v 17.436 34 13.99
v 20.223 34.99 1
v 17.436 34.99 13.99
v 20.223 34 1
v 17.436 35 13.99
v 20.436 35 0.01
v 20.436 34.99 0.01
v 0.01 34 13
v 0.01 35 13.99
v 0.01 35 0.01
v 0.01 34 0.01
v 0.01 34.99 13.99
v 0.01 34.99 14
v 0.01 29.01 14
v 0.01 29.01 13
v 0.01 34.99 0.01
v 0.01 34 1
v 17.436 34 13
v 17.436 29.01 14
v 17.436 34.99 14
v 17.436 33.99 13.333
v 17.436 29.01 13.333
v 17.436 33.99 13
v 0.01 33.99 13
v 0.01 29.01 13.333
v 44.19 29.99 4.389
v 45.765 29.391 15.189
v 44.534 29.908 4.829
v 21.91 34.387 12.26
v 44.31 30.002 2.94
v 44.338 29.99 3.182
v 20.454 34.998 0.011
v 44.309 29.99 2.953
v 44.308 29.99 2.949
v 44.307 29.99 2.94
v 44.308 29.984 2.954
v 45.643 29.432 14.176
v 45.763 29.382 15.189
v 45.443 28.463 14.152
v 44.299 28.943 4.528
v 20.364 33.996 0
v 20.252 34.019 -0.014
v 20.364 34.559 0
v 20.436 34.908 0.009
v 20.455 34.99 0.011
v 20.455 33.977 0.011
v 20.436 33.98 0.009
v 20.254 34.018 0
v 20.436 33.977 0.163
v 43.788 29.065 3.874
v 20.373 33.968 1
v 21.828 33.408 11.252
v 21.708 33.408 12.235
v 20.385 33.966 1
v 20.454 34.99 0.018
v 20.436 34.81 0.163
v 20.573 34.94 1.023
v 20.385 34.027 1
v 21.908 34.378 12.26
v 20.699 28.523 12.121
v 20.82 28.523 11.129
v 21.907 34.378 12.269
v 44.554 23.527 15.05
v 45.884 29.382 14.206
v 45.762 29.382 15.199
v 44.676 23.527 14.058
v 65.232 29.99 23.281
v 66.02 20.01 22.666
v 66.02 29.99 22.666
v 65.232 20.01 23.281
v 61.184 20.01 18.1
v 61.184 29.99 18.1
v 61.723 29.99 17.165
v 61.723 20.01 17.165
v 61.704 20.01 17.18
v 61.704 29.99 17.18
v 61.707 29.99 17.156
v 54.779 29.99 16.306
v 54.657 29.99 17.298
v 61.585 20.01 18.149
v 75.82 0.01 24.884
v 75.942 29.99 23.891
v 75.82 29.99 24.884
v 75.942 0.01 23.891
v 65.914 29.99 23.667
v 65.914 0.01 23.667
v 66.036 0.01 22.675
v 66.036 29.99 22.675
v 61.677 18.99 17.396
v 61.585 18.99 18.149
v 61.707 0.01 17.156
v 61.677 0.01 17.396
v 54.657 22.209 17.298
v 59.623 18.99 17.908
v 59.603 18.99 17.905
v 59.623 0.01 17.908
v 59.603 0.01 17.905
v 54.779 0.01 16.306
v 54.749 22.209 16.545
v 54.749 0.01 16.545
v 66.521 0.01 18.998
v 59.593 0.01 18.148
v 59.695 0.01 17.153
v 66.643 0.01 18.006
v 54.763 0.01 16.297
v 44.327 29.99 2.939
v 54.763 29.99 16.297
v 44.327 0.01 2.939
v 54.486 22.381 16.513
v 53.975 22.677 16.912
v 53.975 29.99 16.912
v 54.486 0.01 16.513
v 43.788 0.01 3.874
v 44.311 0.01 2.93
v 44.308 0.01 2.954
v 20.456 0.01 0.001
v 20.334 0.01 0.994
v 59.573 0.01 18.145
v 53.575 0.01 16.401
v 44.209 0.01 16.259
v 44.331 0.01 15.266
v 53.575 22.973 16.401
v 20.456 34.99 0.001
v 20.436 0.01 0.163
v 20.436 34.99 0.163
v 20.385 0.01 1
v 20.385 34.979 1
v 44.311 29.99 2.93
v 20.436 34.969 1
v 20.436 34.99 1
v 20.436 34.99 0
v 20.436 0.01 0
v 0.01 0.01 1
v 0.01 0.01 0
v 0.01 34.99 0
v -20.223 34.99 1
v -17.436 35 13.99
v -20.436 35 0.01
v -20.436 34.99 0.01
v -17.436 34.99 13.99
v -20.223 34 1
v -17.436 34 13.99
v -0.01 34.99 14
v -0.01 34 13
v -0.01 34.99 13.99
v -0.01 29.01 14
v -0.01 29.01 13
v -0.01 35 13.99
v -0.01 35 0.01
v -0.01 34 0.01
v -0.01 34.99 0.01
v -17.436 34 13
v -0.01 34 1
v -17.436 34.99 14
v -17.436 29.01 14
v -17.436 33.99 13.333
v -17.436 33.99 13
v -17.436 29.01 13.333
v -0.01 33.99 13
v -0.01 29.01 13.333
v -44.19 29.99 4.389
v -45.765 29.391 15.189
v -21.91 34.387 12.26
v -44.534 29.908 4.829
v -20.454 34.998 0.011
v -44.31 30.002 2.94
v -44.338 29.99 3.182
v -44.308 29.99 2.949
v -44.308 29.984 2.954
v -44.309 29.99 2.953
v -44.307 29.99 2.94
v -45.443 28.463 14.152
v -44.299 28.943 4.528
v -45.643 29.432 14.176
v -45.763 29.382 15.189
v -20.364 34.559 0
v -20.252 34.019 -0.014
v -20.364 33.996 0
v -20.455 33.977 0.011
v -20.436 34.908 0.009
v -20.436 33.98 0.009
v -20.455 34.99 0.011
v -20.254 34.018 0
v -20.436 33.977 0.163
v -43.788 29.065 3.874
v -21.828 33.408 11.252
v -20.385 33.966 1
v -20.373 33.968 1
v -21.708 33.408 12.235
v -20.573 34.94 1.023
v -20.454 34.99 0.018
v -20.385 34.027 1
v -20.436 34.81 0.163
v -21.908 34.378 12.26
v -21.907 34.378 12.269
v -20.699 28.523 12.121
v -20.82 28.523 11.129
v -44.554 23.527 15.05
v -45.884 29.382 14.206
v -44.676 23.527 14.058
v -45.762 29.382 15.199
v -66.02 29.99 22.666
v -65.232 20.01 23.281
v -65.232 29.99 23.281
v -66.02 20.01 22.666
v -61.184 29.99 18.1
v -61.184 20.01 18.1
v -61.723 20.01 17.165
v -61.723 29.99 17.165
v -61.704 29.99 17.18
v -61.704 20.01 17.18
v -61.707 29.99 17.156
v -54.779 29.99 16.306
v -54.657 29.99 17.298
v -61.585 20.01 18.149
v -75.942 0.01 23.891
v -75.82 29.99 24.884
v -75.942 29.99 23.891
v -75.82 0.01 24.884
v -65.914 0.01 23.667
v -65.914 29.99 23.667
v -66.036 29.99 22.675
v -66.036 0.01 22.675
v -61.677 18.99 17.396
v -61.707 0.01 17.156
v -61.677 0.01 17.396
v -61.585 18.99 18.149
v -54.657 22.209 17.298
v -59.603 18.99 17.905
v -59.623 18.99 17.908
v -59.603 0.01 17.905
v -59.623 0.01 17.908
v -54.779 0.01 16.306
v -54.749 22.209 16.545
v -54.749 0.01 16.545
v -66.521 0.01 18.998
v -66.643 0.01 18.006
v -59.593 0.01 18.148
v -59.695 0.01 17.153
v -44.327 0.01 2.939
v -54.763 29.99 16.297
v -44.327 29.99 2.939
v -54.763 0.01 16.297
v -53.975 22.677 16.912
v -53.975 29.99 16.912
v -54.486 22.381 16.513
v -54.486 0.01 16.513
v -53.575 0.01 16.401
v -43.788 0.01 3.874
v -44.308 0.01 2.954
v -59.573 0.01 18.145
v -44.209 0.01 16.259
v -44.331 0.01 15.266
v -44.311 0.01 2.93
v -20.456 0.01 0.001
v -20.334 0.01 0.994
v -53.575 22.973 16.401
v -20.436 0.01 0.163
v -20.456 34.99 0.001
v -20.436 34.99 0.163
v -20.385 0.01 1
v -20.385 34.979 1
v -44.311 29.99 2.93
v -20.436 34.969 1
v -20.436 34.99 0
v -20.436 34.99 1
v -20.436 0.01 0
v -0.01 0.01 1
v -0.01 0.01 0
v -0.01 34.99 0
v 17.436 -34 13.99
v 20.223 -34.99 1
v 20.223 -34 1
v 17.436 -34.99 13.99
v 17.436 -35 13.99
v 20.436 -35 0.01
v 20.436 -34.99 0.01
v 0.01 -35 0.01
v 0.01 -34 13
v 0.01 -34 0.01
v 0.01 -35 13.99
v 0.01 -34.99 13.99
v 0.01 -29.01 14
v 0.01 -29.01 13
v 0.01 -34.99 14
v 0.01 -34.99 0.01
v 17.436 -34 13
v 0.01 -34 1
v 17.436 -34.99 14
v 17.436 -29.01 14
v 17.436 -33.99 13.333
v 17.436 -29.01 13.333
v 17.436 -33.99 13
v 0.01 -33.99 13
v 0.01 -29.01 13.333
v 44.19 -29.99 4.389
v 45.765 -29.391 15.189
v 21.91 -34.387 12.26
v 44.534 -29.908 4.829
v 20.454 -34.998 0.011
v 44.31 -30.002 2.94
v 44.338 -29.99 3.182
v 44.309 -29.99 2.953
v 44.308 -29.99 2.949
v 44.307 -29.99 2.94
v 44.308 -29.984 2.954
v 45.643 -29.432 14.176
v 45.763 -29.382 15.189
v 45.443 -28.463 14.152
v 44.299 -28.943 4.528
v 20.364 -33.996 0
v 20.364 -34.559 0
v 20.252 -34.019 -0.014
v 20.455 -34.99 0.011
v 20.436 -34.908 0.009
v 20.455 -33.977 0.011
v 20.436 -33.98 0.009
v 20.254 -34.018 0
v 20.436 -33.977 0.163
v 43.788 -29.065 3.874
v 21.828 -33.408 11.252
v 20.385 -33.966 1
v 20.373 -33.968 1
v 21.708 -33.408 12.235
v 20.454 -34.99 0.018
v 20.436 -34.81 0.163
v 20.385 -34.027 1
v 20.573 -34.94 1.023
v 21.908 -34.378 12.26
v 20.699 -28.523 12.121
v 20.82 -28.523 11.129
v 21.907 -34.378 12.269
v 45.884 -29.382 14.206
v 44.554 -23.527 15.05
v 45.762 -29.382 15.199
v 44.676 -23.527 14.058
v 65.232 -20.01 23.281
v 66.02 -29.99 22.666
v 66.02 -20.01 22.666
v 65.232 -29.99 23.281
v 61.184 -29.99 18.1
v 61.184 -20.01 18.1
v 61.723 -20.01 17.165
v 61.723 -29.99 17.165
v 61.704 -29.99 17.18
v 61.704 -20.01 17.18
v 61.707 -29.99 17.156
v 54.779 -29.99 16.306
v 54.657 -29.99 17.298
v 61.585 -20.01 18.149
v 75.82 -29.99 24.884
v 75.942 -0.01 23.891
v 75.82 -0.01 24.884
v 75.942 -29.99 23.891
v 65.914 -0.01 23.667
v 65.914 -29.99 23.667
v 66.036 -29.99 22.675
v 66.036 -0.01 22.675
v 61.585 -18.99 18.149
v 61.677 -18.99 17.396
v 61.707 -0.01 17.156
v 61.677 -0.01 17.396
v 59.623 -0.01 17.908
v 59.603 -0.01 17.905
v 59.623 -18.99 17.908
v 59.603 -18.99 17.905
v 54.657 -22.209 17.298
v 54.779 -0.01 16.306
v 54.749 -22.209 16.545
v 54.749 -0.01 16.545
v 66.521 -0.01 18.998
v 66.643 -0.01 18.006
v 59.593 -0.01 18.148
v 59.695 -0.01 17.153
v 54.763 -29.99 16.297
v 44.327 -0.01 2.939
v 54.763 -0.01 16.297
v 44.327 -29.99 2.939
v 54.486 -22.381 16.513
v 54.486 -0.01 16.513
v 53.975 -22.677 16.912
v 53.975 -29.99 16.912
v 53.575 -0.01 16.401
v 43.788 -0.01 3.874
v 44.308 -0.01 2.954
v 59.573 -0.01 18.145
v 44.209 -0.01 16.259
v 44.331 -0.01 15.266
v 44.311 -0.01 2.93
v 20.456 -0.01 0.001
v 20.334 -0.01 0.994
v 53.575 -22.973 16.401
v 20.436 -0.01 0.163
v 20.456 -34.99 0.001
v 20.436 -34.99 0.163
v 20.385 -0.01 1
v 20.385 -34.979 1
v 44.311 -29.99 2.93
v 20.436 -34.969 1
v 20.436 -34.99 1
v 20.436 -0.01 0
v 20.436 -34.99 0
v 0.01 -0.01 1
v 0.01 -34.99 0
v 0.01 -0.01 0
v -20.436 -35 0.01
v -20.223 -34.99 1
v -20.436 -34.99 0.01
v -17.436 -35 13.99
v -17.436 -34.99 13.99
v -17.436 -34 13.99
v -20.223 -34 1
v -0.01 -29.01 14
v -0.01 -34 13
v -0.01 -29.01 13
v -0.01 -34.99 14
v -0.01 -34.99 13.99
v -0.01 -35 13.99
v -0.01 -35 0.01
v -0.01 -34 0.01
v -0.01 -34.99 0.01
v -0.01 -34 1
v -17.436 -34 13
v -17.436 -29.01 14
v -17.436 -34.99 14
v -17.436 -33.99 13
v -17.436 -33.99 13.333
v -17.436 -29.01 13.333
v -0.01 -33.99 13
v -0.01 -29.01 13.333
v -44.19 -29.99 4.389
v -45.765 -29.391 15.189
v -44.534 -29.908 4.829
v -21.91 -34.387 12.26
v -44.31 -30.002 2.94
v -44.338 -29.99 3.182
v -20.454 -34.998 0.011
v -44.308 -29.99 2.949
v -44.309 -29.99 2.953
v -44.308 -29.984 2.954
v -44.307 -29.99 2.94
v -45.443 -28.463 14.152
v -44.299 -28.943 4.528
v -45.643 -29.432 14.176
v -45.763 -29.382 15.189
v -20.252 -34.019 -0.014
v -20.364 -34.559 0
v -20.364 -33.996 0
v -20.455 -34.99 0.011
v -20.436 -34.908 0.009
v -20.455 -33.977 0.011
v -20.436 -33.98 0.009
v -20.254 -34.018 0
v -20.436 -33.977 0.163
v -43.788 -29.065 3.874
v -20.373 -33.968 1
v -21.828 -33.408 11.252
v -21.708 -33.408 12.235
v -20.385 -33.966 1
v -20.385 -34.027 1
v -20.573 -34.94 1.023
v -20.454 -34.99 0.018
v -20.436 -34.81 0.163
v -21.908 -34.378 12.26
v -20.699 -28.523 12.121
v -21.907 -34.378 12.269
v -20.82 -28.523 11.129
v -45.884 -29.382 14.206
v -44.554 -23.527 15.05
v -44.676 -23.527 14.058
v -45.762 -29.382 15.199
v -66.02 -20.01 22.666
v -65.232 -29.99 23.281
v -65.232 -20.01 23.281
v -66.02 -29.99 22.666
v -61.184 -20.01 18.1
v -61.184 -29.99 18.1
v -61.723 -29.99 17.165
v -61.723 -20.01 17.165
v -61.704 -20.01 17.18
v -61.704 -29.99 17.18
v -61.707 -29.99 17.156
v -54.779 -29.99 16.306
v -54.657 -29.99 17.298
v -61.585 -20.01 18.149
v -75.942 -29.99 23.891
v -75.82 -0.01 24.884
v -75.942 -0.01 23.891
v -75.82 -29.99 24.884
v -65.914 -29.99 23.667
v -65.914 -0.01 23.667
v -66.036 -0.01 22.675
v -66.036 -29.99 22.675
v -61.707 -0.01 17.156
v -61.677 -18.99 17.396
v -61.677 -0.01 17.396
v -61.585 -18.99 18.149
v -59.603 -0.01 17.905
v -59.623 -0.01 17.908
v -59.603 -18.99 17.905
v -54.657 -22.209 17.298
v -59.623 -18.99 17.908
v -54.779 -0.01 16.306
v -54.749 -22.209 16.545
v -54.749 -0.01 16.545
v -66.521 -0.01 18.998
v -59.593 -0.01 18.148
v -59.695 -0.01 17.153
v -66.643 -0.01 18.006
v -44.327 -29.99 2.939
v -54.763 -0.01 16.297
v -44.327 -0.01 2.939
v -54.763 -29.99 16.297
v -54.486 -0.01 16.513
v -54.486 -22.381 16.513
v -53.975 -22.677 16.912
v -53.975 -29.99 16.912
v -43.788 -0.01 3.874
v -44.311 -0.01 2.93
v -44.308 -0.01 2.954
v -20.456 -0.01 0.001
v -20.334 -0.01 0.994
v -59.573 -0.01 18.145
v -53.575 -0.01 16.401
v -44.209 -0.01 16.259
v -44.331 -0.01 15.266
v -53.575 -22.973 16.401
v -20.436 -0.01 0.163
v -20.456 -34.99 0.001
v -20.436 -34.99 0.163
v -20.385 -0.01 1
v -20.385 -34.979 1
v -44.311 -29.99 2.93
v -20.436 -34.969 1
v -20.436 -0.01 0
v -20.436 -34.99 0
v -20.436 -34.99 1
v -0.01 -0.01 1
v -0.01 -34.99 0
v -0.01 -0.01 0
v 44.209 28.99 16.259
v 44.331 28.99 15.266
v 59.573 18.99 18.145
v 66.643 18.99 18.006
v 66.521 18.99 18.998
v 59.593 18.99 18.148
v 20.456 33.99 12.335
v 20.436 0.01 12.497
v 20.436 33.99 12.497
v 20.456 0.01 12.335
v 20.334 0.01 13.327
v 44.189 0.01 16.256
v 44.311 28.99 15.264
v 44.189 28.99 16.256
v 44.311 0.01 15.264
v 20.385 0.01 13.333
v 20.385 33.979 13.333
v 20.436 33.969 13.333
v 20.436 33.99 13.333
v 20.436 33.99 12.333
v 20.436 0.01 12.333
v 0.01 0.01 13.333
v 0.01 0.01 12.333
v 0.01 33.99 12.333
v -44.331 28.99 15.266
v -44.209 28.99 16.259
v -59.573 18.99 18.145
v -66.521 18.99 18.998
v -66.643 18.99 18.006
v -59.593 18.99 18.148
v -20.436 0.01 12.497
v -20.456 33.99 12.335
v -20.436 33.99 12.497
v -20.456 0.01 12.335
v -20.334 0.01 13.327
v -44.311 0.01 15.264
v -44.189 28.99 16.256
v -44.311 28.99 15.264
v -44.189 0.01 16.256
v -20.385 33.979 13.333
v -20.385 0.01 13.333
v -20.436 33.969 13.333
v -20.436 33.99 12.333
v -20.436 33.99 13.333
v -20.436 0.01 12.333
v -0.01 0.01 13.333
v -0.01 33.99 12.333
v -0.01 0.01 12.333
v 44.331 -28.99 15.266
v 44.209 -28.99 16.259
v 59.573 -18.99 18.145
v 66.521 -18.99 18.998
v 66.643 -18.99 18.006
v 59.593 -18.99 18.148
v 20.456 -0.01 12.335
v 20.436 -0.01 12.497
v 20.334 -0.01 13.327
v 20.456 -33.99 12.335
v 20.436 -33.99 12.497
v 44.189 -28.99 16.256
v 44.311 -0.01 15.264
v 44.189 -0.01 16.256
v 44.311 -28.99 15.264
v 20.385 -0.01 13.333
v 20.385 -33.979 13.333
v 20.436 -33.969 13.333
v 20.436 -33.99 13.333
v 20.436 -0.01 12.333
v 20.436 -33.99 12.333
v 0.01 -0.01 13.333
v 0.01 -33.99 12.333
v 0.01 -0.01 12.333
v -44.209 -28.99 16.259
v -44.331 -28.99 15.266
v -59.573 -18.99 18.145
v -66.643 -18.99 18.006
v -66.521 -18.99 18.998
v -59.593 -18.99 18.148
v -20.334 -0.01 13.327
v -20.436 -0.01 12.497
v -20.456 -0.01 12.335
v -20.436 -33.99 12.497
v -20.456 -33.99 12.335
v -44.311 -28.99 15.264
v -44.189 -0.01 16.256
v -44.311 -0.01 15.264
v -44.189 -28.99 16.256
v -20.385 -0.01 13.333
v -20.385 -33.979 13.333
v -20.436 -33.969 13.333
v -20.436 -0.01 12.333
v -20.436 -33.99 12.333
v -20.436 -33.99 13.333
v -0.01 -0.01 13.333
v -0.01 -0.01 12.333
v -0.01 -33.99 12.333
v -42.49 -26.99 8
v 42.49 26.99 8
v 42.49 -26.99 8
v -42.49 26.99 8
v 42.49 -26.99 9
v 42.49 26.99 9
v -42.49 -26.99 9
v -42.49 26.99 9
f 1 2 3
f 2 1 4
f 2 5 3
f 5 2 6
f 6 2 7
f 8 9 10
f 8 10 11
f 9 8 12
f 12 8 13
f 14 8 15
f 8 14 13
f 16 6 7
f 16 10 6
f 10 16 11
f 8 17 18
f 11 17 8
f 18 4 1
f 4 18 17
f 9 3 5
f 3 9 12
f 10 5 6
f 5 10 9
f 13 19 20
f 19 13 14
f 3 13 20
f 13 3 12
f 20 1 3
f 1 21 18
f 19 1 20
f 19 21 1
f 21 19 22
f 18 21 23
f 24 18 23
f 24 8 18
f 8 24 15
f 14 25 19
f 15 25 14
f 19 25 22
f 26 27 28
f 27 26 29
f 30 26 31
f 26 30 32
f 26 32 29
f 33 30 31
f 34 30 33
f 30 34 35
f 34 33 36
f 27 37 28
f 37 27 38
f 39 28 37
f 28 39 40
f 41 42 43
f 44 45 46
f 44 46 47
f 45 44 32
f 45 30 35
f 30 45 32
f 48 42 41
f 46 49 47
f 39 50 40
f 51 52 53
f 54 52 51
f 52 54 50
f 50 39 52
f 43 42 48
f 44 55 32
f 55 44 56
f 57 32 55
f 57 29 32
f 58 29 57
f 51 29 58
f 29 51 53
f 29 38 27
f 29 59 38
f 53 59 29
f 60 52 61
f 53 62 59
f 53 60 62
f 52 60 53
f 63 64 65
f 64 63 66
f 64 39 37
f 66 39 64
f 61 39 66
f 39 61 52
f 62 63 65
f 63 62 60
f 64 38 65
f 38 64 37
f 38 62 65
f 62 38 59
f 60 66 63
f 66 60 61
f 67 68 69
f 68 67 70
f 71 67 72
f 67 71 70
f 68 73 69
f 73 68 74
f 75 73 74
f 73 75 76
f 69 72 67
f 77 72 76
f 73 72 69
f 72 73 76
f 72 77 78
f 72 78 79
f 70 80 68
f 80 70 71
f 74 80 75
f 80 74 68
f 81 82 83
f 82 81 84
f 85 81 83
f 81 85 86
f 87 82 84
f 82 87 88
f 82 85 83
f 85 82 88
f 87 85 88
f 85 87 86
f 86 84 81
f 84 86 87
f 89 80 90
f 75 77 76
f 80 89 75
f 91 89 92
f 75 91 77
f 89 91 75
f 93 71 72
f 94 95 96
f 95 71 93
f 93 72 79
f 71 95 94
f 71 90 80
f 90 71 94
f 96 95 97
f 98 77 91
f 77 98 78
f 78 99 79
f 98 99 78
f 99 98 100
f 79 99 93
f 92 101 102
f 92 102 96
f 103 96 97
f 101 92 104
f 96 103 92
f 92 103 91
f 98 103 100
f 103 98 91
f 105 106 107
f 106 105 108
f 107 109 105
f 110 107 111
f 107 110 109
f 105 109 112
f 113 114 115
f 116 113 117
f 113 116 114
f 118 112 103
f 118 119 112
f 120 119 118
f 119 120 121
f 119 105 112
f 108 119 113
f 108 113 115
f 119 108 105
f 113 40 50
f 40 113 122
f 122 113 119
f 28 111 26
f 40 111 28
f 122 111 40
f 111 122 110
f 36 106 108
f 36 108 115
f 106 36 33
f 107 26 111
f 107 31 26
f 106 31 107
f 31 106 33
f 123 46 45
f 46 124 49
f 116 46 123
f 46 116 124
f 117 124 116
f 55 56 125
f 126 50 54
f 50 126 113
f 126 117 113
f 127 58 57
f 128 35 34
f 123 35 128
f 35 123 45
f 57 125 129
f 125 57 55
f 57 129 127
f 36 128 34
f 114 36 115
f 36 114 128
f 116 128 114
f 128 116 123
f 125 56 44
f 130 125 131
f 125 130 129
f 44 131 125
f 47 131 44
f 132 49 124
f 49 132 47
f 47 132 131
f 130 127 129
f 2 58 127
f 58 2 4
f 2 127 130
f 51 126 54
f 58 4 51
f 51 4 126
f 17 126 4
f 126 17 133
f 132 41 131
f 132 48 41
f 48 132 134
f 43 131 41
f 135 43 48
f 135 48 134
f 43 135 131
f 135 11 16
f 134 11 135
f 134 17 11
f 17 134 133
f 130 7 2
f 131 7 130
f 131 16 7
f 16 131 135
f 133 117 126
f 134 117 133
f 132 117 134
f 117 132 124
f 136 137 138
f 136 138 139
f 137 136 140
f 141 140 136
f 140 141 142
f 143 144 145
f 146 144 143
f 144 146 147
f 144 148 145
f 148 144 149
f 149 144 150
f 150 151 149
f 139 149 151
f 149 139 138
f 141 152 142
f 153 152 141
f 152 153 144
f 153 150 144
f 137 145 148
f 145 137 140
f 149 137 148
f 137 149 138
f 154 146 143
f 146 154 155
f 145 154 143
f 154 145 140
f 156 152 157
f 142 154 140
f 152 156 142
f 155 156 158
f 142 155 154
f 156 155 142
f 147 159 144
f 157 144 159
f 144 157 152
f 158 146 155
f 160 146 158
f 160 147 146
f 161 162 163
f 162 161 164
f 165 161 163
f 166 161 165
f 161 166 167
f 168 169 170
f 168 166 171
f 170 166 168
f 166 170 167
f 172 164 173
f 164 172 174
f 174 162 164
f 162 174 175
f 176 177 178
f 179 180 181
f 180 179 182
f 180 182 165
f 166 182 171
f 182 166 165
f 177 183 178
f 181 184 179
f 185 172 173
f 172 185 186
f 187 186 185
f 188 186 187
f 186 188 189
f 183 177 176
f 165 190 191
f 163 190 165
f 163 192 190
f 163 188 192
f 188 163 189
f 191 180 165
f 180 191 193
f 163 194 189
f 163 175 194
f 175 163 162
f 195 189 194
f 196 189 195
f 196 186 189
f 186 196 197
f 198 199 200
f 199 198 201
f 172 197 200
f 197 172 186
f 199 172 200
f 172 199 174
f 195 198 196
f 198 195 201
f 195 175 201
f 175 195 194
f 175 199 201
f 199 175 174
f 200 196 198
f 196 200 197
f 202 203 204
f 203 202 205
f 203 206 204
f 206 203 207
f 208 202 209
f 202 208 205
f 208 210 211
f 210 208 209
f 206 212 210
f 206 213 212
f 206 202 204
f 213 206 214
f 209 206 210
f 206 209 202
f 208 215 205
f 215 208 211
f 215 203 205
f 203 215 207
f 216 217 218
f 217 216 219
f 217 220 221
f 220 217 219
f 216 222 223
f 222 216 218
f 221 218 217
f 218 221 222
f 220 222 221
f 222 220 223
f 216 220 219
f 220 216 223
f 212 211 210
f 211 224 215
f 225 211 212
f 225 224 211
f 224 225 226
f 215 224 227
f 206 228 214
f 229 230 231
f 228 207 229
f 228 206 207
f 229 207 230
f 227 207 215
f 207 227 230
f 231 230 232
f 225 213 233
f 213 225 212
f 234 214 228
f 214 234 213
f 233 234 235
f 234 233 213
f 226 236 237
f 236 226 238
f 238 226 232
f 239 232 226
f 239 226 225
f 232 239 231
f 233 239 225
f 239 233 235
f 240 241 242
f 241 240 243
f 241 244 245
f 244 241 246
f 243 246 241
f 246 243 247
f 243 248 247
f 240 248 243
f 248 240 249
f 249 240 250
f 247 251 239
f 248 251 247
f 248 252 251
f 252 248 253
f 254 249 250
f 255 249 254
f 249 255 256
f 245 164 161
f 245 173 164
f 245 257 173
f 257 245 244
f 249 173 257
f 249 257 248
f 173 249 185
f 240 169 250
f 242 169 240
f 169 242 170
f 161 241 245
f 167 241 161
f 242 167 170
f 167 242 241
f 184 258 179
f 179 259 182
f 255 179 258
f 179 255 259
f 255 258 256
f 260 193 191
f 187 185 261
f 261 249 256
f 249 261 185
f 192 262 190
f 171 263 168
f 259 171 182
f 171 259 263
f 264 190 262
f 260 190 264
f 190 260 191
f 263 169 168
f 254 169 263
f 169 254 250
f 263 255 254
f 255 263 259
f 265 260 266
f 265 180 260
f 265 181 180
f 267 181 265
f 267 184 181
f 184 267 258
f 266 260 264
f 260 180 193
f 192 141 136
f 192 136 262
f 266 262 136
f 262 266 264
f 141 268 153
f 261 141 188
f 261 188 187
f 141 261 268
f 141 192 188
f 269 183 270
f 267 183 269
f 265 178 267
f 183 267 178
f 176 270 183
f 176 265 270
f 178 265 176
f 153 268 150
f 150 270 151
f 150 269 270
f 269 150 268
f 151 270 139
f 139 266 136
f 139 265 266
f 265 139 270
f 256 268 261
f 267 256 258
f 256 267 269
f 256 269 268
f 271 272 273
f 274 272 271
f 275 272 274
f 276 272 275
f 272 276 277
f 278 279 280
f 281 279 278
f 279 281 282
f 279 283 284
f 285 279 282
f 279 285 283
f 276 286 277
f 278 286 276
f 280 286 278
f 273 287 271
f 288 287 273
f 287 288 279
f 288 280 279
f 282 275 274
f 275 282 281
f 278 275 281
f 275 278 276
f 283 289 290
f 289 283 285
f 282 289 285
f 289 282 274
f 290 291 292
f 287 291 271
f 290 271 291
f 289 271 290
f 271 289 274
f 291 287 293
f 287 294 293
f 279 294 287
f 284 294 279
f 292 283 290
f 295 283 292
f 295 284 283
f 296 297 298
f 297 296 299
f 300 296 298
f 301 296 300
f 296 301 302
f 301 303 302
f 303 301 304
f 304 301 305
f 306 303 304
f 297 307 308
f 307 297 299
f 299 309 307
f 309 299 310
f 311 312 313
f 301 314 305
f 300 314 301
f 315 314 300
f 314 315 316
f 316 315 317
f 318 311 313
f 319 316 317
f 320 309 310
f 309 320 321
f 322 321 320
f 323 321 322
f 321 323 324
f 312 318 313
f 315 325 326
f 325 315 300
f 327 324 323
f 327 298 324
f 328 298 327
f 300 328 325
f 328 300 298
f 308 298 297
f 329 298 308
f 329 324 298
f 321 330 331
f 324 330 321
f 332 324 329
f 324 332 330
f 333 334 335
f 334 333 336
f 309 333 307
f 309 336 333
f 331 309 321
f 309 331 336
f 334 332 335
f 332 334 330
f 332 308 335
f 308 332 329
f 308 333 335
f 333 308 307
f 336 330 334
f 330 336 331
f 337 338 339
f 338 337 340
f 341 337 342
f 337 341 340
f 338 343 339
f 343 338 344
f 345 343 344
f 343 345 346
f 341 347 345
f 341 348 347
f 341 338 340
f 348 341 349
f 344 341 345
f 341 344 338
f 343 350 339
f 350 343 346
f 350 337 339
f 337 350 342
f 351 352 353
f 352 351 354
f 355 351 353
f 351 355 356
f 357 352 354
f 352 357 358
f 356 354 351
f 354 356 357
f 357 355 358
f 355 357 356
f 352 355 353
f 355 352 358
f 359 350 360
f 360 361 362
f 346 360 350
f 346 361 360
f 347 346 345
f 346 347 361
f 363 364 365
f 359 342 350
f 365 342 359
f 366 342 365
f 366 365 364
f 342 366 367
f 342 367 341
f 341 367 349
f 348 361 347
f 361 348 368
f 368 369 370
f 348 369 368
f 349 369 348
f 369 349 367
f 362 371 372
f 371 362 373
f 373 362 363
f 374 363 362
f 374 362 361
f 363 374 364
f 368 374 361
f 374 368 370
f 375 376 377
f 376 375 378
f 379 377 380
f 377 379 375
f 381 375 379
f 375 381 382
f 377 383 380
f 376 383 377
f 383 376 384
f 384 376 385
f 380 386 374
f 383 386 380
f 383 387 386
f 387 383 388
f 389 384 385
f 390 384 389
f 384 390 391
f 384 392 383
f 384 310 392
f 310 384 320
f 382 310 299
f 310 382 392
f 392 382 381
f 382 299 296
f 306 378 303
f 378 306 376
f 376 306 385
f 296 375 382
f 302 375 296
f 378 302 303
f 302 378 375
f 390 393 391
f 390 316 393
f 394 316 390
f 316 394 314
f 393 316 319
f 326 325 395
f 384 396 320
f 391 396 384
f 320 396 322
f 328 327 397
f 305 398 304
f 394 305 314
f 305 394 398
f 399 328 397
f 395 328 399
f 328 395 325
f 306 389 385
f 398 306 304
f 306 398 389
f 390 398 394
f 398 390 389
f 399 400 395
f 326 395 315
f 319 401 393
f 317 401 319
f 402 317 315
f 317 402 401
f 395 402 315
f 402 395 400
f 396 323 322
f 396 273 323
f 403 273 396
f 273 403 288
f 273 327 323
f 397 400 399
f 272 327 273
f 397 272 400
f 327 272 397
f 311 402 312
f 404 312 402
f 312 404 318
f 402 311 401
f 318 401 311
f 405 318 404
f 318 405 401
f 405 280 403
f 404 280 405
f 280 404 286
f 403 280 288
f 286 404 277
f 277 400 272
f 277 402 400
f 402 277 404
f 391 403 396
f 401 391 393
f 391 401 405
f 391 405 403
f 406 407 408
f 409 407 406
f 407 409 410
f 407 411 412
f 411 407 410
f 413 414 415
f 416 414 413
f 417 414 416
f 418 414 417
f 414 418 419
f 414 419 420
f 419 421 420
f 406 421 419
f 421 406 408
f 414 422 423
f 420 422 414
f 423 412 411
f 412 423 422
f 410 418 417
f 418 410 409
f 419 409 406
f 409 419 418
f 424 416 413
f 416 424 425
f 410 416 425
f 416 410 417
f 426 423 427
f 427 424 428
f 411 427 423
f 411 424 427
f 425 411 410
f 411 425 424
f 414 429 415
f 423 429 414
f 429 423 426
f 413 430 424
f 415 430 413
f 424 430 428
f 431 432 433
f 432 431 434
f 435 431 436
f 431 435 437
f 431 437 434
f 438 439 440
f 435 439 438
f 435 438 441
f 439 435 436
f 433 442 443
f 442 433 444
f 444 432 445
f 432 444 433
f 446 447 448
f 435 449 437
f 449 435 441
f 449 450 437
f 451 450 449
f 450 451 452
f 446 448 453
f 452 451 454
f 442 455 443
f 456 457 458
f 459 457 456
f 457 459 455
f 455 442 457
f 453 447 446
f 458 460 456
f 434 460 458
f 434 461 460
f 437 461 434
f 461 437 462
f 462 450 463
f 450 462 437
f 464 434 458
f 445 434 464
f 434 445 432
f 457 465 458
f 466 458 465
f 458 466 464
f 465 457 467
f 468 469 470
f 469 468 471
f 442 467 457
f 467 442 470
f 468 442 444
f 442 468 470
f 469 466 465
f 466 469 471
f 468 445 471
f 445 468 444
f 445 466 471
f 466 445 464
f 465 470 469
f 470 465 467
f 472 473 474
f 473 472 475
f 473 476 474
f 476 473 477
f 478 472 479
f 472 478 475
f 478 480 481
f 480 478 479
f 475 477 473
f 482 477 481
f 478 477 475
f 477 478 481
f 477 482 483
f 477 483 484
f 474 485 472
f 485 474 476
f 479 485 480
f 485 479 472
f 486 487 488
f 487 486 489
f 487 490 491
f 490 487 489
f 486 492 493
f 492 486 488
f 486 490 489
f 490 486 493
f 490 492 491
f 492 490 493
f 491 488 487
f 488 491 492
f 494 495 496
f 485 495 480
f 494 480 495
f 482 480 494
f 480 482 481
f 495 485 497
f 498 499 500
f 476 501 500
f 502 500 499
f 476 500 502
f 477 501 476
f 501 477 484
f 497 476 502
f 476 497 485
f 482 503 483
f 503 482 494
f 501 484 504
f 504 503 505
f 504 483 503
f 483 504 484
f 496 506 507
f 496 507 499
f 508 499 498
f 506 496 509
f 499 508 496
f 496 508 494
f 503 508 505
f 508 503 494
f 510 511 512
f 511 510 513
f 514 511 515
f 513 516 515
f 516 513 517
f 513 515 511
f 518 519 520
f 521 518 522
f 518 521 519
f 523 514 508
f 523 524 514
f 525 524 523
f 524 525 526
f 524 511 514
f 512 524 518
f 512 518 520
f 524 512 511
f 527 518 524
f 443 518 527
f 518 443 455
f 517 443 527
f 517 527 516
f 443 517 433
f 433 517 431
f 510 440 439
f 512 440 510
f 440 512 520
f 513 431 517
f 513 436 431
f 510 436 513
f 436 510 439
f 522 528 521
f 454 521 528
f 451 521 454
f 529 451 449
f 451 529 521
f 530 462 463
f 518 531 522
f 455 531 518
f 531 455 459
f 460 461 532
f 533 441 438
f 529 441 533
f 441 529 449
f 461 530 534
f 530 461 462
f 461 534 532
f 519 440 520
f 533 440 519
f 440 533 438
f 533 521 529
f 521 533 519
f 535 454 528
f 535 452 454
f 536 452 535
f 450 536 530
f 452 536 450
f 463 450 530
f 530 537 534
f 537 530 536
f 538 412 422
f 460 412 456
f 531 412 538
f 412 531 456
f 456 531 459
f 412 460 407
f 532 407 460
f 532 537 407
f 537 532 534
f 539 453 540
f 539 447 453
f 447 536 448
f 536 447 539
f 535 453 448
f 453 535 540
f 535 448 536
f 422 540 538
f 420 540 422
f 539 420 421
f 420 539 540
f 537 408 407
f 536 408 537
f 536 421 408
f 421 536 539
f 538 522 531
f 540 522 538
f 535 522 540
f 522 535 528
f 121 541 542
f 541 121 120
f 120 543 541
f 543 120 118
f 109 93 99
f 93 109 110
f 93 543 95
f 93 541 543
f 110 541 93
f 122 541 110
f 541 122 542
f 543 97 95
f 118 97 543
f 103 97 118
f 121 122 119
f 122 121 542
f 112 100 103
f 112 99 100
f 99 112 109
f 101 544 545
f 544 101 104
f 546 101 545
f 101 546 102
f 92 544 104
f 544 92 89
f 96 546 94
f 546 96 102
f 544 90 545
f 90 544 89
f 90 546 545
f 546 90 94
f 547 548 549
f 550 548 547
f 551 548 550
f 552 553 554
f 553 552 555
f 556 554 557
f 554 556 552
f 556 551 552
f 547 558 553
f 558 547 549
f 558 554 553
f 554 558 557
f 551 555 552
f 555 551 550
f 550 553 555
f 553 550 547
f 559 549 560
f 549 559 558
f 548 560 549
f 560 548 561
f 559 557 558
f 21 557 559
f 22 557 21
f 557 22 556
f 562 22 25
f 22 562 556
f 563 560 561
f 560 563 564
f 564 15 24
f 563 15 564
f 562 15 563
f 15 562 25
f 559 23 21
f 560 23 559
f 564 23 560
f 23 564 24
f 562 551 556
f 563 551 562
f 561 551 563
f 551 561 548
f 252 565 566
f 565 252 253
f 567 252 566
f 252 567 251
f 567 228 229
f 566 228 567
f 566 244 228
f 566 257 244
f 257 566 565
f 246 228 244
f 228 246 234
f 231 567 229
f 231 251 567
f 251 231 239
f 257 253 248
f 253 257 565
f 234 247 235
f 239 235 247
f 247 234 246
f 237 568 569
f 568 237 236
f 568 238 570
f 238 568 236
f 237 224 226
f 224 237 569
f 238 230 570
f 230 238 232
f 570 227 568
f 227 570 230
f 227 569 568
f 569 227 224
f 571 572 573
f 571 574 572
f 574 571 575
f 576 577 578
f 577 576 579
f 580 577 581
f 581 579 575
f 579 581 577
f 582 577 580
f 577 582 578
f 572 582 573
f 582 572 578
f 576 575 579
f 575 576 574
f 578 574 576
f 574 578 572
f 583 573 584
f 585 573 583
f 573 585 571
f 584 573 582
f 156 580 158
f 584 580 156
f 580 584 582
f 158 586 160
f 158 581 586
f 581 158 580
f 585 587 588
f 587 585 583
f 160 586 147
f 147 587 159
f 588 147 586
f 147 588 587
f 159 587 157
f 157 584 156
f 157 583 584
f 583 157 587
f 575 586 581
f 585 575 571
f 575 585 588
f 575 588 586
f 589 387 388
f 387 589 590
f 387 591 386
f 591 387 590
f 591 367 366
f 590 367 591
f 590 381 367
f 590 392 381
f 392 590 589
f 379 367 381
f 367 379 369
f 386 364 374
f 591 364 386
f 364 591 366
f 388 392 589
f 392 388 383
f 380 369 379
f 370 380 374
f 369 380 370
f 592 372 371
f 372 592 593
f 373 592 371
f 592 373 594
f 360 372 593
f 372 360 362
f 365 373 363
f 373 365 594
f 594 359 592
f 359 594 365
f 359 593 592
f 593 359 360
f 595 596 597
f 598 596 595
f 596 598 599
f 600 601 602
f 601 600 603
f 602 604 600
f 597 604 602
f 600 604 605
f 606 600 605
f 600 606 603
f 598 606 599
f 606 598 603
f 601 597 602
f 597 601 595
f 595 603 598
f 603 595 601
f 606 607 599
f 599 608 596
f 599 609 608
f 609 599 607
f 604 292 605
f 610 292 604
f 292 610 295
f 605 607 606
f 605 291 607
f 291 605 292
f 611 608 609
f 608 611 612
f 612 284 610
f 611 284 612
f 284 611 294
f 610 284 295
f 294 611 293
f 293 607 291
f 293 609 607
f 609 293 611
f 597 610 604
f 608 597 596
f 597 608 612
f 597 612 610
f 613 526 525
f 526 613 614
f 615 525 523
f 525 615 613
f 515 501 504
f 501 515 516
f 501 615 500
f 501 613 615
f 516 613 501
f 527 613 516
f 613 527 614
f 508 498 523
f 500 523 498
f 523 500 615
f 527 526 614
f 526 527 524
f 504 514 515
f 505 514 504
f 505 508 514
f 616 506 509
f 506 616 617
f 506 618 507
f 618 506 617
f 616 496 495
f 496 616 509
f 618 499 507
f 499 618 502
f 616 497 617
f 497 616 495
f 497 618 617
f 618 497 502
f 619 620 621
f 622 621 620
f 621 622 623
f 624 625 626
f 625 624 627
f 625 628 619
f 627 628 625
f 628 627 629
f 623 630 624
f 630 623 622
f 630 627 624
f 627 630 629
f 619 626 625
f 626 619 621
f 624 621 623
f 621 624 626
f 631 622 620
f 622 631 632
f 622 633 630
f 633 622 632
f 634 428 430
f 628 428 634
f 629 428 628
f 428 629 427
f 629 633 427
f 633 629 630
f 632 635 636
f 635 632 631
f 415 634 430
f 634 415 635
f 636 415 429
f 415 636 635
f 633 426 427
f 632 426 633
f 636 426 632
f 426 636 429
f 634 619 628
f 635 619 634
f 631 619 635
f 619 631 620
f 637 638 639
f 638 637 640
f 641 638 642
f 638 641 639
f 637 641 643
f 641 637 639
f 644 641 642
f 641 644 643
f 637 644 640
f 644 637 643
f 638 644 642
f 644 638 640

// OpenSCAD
// mode settings

mode = 0; // [0:Flexed, 1:Half flexed, 2:Plane, 3:Animation, 4:Base proj, 5:Cap proj]


anim = ($t<0.5) ? $t*2:(1-$t)*2;
alphaModes = [1,0.5,0,anim,0,0];
alpha = alphaModes[mode];

isBaseProj = mode==4;
isCapProj = mode==5;
isProj = isBaseProj || isCapProj; 

// visible settings 

isBase = true;
isCap = true;
isCred = true; 

xCred=85; 
yCred=54; 
xCredPad=2; 
yCredPad=3;

wMet = 1;
angleSide = 7;

hFlexSide = 12;
hFlexCenter = 14;
coneFlex = 3;
hLimb = 6;

xBase = (xCred+xCredPad*2);

coneSide=5;
xSide = xBase/3.7;
ySideHalf = yCred/2+yCredPad;

xCenterHalf = xBase/2-xSide;
yCenterHalf = yCred/2+yCredPad+coneSide;

xStartHole = 7;          
xBodyHole = 7;
xEndHole = 10;          
yHole = 40;          

module stop_wizard() {}

eps=0.01; // for flex painting

xDown=gipo(hFlexSide, hFlexSide); // 45 deg
dHole = ySideHalf-yHole/2;          
wFlexSide=gipo(coneSide, xSide);

function gipo(x,y) = sqrt(x*x+y*y);  

module trapV(x,y,dx1,dx2) {
    linear_extrude(1) {
    polygon( [
         [0+eps,0+eps],
         [0+eps+dx1,y-eps],
         [x-dx2-eps,y-eps],
         [x-eps,0+eps]]
        );   
    } 
}

module trapG(x,y,dy1,dy2) {
    linear_extrude(1) {
    polygon( [
         [0+eps,0+eps],
         [0+eps,y-eps],
         [x-eps,y-dy1-eps],
         [x-eps,0+dy2+eps]
        ]);   
    } 
}

module quad(x,y) {
 translate([eps,eps,0])   
 cube([x-2*eps,y-2*eps,1]);   
  }


module base() {
    
   // Center Segment 
   quad(xCenterHalf,yCenterHalf);

   translate([0,yCenterHalf,0]) {
      rotate(90*alpha,[1,0,0]) {   
         trapV(xCenterHalf, hFlexCenter,0, coneFlex);
         translate([0,hFlexCenter,0]) {   
           rotate(90*alpha,[1,0,0]) {   
              trapV(xCenterHalf-coneFlex, hLimb,0,0);
           }    
         }
      }    
   }

   // Side Segment
   
   translate([xCenterHalf,0,0]) 
      rotate(-angleSide*alpha,[0,1,0]) {
      trapG(xSide,yCenterHalf, coneSide,0);
      translate([0,yCenterHalf,0])
           rotate(-atan(coneSide/xSide))
             rotate(90*alpha,[1,0,0]) {    
               trapV(wFlexSide, hFlexSide, 
                    coneFlex,-coneFlex);
               translate([coneFlex, hFlexSide,0])  
                 rotate(90*alpha,[1,0,0])     
                   quad(wFlexSide, hLimb);
             }  

 
   translate([xSide,0,0])
    rotate(-45*alpha,[0,1,0]) {     
      trapG(xDown,ySideHalf,0,0);
      translate([xDown,0])  
        rotate(45*alpha,[0,1,0]) {      
          quad(xStartHole,ySideHalf);
          translate([xStartHole,0,0])
            rotate(-45*alpha,[0,1,0]) {
              translate([0,ySideHalf-dHole,0])
                 quad(xBodyHole, dHole);
              translate([xBodyHole,0,0])
                 rotate(45*alpha,[0,1,0])
                    quad(xEndHole, ySideHalf);
            }  
     }      
   } 

}   
} 

module cap() {
    
   yCenterCapHalf = yCenterHalf-wMet; 
   // Center Segment 
   quad(xCenterHalf,yCenterCapHalf);
 
   // Side Segment
   translate([xCenterHalf,0,0])  
      rotate(-angleSide*alpha,[0,1,0]) { 
         trapG(xSide,yCenterCapHalf, coneSide,0);
         translate([xSide,0,0]) { 
           trapG(hFlexSide+xStartHole/2,
              yCenterCapHalf-coneSide,
             (yCenterCapHalf-coneSide) - (yHole/2-wMet),0);
           translate([hFlexSide+xStartHole/2,0,0])  
              quad(xStartHole,yHole/2-wMet);
         }    
      }    
   
}

module base2() {
 base();
 mirror([1,0,0]) base();
}

module base4() {
 base2();
 mirror([0,1,0]) base2();    
}

module cap2() {
 cap();
 mirror([1,0,0]) cap();
}

module cap4() {
 cap2();
 mirror([0,1,0]) cap2();    
}

if (isBase && !isProj) {
    color([0.7,0.7,0.7])
    base4();
}

if (isCred && !isProj) {
    color([0,0.5,0.5])
    translate([-xCred/2,-yCred/2, hFlexSide/3*2])
    trapV(xCred, yCred,0,0);
}    

if (isCap && !isProj) {
    color([0.85,0,0.85])
    translate([0,0, hFlexSide+wMet/3])
    cap4();
}

if (isBaseProj) {
  projection()  
    base4();
}

if (isCapProj) {
  projection()  
    cap4();
}

function getLen() = 
  4* (
  ySideHalf+
  xStartHole + xBodyHole + xEndHole +
  xDown + 
  hFlexSide*2+hLimb*2 + wFlexSide + 
  xCenterHalf + hFlexCenter + hLimb +
  yHole+xBodyHole
  );

echo(getLen());
